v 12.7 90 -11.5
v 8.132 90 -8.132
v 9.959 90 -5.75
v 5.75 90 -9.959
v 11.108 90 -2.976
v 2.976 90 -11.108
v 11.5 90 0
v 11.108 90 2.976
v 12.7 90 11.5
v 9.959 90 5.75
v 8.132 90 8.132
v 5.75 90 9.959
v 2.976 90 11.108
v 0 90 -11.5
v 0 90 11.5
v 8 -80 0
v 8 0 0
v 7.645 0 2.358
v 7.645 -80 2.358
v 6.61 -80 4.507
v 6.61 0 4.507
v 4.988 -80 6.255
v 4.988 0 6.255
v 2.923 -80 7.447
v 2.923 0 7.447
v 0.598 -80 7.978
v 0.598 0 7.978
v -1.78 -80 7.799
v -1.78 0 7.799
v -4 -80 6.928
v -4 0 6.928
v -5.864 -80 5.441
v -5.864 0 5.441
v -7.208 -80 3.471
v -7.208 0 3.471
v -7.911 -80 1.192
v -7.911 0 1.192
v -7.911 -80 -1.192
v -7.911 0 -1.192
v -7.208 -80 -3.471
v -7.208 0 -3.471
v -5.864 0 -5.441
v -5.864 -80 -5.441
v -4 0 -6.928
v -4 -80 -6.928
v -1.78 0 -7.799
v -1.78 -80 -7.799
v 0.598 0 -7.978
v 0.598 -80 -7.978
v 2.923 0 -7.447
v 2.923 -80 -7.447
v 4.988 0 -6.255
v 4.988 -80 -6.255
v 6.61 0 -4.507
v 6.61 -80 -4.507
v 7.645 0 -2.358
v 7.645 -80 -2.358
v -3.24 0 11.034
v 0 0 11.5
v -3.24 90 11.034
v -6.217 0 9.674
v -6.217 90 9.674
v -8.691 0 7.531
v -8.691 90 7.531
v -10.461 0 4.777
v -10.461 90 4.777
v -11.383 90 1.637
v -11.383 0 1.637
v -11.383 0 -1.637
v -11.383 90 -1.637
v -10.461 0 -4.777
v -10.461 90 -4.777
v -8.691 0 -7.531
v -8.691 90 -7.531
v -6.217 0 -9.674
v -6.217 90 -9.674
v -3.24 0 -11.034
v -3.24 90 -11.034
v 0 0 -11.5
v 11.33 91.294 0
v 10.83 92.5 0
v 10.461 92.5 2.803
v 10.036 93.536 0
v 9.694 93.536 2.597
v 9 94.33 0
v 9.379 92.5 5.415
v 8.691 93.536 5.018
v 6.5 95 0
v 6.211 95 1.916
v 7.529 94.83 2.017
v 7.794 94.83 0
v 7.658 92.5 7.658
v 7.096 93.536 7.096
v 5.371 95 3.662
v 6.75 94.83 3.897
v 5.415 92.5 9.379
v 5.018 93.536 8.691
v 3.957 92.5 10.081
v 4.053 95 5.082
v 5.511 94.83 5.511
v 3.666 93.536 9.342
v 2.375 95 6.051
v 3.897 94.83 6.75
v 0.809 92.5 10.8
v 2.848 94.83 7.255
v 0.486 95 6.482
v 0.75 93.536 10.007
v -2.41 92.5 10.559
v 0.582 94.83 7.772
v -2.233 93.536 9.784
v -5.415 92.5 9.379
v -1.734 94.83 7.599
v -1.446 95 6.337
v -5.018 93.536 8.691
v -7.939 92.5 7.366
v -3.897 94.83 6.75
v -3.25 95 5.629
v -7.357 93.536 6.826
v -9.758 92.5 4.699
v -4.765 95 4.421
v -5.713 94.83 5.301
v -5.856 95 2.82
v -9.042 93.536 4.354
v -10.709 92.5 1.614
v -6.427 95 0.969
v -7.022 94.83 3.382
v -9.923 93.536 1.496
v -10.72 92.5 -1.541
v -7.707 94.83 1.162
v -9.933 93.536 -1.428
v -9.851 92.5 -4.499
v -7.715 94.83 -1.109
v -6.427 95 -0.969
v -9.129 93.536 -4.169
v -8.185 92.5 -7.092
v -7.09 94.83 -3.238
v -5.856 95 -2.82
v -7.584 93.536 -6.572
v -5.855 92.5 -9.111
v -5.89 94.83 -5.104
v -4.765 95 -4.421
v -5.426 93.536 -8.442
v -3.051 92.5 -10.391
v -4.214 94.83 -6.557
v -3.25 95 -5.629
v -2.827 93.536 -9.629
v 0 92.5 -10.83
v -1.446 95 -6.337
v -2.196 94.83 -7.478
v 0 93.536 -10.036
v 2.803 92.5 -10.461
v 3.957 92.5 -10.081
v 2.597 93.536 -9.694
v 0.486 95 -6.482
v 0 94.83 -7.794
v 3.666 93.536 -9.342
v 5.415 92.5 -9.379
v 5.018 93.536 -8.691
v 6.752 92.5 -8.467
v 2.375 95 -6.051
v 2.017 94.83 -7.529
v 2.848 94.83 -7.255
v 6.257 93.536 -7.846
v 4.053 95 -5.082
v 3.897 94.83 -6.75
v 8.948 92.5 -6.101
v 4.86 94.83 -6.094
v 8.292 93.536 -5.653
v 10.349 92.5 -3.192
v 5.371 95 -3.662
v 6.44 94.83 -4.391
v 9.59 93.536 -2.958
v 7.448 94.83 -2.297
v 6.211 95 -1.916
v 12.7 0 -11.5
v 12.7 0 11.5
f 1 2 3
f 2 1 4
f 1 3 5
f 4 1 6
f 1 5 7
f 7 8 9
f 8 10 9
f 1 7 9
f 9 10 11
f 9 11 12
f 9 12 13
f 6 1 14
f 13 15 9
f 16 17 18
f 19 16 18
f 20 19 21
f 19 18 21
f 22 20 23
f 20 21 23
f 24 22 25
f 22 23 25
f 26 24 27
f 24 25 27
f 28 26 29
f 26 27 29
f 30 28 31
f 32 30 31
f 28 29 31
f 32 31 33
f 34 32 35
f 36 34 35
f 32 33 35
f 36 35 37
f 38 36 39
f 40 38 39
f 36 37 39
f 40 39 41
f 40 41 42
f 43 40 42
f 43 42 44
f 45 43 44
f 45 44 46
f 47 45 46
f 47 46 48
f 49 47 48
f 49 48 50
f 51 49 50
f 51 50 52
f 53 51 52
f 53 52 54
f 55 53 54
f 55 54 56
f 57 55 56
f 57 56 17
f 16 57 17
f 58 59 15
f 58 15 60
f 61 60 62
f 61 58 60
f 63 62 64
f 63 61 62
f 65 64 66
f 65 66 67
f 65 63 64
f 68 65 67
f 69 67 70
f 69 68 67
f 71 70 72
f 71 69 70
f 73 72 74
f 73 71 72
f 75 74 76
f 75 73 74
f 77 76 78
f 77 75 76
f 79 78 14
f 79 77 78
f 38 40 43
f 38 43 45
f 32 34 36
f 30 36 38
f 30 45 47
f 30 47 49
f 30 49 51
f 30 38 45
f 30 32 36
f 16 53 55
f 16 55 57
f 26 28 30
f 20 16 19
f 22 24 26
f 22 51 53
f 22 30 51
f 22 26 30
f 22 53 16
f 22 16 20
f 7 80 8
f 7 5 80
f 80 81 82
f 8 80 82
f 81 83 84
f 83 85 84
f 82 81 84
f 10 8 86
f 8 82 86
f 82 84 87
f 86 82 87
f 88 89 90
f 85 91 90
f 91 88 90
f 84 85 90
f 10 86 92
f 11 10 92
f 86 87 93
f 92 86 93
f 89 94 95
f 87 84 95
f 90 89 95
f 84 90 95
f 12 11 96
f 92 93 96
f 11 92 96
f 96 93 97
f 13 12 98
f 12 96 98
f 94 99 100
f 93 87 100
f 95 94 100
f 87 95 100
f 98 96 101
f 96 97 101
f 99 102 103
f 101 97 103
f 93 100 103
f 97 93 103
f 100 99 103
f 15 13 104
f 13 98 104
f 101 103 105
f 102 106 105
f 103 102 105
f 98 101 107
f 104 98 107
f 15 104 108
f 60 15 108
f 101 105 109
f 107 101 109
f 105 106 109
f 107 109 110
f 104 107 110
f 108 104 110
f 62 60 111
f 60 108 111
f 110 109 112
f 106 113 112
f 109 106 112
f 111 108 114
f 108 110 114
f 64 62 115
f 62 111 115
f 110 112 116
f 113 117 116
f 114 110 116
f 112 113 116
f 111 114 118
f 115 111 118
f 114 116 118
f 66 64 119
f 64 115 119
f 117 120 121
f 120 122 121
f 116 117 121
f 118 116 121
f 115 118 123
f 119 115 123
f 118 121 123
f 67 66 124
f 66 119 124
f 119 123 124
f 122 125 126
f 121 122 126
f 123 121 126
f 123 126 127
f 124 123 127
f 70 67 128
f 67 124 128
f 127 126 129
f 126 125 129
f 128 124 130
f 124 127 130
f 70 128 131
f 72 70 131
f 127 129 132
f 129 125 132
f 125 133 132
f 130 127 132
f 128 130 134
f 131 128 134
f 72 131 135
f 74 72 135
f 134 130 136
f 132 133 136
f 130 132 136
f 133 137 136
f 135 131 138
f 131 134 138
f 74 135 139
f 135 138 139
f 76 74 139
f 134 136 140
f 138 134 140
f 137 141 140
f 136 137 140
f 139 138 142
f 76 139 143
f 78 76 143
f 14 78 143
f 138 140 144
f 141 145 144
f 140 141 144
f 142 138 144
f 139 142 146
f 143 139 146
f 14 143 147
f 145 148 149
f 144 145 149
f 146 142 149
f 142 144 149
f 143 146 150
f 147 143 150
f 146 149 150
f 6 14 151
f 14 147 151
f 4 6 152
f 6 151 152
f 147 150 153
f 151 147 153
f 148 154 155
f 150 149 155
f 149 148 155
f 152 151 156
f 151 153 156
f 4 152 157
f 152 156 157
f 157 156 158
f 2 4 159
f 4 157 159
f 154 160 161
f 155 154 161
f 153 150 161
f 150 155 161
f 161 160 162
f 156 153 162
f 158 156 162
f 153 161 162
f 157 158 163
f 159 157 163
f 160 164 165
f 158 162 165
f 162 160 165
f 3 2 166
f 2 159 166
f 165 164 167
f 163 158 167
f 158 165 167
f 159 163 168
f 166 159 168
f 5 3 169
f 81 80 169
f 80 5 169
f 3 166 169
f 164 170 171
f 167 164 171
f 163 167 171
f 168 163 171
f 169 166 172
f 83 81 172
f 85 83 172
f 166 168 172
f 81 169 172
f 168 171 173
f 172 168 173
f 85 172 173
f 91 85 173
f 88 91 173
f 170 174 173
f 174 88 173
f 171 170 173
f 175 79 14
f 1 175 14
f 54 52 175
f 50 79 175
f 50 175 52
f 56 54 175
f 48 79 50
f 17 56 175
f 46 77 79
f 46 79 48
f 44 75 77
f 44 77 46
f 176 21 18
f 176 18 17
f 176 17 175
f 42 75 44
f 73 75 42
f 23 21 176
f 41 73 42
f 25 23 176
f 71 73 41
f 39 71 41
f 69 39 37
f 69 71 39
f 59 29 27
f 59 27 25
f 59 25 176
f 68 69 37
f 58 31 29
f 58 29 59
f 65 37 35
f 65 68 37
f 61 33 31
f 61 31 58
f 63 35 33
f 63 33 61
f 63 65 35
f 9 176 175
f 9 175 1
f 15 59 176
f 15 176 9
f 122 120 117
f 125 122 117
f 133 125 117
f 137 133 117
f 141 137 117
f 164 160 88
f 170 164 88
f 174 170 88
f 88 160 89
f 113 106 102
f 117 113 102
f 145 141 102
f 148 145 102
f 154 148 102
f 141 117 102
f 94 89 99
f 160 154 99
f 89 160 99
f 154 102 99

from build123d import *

# Parameters (mm, degrees)
F0_R     = 11.5
F2_DEPTH = 95
F1_R     = 8
F3_DEPTH = 80
F4_R     = 5
F5_W     = 90
F5_H     = 23
F6_DEPTH = 12.7


with BuildPart() as f2:
    # F0 (on Front) → F2 (new body)
    with BuildSketch(Plane.XZ):
        Circle(F0_R)
    extrude(amount=-F2_DEPTH)

    # F1 (on Front) → F3 (join)
    with BuildSketch(Plane.XZ):
        Circle(F1_R)
    extrude(amount=F3_DEPTH)

    # F4
    f4_edges = [f2.edges().sort_by_distance(p)[0] for p in [
        (-11.5, 95, 0),
    ]]
    fillet(f4_edges, radius=F4_R)

    # F5 (on Right) → F6 (join)
    with BuildSketch(Plane.YZ):
        with Locations((45, 0)):
            Rectangle(F5_W, F5_H)
    extrude(amount=F6_DEPTH)


solid = f2.part
